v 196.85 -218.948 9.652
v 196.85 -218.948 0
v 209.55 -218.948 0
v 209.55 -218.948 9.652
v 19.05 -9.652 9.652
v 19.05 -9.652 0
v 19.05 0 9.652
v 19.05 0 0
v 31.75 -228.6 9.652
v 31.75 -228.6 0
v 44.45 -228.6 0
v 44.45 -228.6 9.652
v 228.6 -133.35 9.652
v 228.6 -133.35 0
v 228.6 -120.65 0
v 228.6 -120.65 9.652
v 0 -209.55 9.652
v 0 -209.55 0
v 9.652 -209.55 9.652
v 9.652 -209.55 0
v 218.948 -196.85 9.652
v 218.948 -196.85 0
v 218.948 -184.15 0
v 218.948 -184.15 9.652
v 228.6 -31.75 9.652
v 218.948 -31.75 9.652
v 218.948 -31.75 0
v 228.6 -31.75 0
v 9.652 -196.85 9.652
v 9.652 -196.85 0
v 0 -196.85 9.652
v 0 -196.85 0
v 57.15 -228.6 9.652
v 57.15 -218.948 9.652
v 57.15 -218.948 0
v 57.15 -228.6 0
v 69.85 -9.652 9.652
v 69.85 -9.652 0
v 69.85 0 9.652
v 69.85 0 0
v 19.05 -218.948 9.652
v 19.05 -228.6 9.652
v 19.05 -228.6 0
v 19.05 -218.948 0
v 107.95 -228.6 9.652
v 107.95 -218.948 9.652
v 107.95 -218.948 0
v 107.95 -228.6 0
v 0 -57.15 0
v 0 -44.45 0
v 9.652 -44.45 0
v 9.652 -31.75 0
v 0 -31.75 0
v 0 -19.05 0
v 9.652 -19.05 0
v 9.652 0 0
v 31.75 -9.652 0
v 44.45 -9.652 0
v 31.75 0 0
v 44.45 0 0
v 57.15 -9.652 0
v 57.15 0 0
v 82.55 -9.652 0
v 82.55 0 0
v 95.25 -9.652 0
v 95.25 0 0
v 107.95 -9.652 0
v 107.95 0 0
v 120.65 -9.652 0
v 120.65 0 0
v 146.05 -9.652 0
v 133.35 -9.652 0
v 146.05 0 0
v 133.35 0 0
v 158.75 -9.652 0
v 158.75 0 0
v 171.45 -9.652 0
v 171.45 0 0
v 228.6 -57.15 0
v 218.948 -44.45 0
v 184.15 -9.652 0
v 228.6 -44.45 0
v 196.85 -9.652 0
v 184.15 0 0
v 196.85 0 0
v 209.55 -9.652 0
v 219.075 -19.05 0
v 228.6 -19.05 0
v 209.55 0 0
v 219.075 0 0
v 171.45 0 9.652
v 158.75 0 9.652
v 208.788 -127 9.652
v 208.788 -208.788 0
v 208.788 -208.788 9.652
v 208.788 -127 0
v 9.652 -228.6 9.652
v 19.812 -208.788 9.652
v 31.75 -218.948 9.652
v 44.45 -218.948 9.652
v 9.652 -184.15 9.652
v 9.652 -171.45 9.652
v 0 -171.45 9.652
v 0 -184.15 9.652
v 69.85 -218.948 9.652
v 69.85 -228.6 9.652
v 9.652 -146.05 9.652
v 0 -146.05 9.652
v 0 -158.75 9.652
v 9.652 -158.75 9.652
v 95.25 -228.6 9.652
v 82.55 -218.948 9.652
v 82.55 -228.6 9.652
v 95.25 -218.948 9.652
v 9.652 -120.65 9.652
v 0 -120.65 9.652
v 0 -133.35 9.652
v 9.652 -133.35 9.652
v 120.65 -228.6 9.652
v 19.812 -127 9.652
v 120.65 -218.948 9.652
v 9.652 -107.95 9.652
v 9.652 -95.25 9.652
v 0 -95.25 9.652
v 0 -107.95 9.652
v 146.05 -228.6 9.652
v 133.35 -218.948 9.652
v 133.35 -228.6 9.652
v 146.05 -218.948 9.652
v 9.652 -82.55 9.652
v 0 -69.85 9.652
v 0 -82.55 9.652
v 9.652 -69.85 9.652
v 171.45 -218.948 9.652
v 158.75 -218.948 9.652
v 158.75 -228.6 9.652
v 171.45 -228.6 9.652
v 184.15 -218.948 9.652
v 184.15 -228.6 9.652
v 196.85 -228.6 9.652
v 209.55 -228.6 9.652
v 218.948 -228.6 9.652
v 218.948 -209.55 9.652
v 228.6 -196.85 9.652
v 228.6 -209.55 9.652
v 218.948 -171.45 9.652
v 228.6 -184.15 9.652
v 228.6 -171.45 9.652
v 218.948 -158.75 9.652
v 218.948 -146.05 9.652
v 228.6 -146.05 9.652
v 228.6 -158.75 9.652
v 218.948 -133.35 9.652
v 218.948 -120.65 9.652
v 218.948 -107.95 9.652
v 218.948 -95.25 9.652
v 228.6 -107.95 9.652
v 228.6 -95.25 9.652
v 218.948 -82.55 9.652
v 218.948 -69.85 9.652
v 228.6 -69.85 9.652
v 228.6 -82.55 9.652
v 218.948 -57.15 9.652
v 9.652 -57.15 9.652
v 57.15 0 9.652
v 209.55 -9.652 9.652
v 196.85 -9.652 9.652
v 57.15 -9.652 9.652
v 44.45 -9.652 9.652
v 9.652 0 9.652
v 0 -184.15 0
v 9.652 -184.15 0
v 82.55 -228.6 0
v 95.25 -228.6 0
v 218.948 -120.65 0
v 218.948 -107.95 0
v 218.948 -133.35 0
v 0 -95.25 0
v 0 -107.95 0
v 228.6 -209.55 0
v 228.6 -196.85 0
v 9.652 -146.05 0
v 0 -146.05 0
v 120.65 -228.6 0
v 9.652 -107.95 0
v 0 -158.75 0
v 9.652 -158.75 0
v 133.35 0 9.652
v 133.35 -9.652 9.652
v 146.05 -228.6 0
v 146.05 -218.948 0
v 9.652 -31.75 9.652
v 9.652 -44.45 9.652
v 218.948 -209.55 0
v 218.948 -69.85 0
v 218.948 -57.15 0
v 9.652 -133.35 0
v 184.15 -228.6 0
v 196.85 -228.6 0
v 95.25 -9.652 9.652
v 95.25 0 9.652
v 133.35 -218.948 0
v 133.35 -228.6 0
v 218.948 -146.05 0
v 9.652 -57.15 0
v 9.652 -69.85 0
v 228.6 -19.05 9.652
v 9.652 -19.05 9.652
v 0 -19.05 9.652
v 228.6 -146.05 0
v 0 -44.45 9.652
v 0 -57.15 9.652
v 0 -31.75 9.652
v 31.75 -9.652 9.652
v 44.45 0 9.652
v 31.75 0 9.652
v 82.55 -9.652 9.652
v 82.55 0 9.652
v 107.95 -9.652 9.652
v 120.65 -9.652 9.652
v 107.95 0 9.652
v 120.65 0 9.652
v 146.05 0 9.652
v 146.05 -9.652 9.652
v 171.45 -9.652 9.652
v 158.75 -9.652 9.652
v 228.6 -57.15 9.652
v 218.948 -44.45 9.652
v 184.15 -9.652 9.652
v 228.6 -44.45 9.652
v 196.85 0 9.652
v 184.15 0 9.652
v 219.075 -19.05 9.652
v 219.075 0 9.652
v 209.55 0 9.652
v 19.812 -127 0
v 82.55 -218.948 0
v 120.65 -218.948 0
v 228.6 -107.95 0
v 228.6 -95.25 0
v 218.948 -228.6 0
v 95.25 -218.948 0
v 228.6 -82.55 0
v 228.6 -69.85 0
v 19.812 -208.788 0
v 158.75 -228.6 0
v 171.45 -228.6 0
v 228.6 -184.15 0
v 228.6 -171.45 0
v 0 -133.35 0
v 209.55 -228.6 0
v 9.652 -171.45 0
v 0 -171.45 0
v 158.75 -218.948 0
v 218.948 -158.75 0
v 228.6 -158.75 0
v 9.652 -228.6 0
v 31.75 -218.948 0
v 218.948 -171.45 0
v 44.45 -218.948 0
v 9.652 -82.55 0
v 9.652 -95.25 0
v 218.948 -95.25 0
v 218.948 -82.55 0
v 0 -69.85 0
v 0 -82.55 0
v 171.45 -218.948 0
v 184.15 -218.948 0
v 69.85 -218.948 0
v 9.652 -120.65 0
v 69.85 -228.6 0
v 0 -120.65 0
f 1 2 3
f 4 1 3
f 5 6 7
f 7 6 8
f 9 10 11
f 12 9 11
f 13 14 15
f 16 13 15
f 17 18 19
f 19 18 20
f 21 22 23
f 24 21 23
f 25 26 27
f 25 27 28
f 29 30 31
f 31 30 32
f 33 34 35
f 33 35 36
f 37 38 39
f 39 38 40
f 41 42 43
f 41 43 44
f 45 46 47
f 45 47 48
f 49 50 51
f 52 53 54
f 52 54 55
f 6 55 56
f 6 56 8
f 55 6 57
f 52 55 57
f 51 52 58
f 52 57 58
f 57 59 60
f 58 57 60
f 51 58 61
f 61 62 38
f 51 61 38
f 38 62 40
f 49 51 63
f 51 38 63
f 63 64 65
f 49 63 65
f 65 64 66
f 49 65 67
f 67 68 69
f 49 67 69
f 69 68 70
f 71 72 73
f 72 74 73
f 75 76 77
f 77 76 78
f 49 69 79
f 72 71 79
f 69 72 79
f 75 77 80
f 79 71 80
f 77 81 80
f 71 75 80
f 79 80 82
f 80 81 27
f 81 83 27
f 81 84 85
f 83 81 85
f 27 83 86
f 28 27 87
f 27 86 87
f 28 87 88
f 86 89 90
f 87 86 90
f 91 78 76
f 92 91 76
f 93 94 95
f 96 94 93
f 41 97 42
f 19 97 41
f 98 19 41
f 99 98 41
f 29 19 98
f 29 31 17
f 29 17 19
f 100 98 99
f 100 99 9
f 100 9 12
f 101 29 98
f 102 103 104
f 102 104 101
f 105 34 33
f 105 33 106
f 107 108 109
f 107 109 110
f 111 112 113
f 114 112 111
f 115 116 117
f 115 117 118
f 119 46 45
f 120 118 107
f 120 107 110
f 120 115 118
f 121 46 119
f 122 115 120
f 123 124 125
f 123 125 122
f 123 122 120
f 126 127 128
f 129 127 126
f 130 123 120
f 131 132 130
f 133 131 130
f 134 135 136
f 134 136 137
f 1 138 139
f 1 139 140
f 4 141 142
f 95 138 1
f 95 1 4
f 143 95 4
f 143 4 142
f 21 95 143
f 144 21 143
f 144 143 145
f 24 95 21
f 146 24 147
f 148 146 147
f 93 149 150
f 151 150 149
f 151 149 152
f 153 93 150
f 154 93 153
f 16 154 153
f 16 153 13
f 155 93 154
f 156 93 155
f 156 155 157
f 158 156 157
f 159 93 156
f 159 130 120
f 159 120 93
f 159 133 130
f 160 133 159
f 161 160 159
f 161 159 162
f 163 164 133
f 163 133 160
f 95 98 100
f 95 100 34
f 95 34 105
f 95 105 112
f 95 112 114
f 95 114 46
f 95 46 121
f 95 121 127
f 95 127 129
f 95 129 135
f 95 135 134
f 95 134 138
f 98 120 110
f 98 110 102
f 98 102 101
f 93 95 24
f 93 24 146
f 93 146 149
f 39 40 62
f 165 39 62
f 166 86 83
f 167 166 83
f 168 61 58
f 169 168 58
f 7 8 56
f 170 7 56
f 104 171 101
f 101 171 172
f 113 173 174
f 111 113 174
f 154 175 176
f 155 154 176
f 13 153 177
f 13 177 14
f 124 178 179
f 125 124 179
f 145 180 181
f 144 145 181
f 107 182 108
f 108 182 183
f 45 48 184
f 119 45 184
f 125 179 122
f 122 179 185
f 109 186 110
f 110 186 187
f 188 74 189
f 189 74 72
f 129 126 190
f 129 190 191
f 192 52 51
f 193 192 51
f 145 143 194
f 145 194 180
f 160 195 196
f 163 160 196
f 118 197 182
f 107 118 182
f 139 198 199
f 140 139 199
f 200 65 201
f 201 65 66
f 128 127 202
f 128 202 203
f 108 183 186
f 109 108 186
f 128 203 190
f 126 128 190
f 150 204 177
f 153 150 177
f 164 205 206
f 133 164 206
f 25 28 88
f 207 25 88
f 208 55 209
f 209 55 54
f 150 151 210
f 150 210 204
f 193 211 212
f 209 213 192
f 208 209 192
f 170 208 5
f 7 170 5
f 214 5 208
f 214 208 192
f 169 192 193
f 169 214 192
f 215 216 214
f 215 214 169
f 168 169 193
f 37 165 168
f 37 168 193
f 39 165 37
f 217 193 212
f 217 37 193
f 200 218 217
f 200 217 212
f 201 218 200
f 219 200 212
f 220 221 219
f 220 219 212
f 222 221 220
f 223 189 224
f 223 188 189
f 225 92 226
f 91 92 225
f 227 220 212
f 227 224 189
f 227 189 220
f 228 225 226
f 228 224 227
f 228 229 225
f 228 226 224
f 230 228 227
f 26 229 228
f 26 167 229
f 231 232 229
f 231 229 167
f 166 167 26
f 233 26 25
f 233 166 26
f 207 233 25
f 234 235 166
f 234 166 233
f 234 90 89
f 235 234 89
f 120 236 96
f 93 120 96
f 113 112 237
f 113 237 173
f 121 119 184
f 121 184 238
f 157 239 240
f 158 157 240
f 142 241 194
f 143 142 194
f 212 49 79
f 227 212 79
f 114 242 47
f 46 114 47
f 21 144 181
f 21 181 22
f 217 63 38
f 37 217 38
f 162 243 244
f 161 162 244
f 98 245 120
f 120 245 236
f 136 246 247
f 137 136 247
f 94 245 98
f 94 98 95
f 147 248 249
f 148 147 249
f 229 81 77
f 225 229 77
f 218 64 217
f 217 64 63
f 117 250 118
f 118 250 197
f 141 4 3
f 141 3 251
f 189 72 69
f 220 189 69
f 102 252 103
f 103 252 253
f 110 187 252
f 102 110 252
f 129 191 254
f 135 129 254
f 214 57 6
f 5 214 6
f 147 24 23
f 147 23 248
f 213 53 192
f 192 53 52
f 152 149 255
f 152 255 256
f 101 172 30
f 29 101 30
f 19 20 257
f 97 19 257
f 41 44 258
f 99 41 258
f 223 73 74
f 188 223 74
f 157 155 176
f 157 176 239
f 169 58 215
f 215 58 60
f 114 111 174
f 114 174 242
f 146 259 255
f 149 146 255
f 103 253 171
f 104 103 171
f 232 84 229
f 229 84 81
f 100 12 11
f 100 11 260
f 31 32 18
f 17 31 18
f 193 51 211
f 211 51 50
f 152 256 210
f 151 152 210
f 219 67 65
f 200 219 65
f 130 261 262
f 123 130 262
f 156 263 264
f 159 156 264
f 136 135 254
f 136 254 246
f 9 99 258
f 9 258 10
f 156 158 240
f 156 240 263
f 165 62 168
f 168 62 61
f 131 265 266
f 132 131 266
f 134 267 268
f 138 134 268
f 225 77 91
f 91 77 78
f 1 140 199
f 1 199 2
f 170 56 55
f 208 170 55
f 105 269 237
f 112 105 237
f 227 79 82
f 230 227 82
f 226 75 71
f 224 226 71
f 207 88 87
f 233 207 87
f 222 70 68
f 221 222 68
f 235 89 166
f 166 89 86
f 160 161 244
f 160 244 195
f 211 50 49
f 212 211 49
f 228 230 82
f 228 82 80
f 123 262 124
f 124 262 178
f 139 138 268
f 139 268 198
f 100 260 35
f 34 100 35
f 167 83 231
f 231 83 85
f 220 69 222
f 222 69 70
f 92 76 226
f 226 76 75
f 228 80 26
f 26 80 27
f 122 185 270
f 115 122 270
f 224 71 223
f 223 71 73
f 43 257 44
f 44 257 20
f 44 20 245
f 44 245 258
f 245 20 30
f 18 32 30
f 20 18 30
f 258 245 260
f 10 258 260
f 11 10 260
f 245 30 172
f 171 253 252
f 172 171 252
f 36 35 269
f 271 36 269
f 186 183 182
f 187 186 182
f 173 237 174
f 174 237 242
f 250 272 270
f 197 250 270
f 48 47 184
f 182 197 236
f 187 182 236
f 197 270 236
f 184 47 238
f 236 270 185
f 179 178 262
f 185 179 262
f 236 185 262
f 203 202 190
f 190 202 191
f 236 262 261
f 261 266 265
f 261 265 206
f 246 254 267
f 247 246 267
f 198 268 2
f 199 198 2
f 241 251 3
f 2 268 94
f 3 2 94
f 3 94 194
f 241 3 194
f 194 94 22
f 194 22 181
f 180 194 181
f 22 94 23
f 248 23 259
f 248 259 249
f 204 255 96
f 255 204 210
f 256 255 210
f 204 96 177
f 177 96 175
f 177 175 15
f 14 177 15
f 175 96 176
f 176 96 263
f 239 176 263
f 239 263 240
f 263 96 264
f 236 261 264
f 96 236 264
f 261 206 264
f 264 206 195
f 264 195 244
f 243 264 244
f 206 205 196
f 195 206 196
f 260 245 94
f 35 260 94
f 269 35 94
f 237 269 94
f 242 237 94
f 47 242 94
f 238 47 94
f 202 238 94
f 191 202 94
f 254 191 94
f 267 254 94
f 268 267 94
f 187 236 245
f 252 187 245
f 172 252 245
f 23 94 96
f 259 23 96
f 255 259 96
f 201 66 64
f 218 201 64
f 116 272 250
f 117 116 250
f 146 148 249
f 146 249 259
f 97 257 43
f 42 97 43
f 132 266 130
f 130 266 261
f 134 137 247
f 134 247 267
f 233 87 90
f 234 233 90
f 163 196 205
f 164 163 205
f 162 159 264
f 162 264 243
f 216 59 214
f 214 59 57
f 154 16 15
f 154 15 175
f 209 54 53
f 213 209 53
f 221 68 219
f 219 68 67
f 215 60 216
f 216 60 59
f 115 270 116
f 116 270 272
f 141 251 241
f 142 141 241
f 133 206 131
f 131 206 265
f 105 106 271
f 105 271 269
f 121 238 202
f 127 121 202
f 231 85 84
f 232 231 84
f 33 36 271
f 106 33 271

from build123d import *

# Parameters (mm, degrees)
F1_DEPTH = 9.652
F0_W     = 188.976
F0_H     = 81.788
F2_DEPTH = 9.652


with BuildPart() as f1:
    # F0 (on Top) → F1 (new body)
    with BuildSketch(Plane.XY):
        Polygon((19.05, 0), (9.652, 0), (9.652, -19.05), (0, -19.05), (0, -31.75), (9.652, -31.75), (9.652, -44.45), (0, -44.45), (0, -57.15), (9.652, -57.15), (218.948, -57.15), (228.6, -57.15), (228.6, -44.45), (218.948, -44.45), (218.948, -31.75), (228.6, -31.75), (228.6, -19.05), (219.075, -19.05), (219.075, 0), (209.55, 0), (209.55, -9.652), (196.85, -9.652), (196.85, 0), (184.15, 0), (184.15, -9.652), (171.45, -9.652), (171.45, 0), (158.75, 0), (158.75, -9.652), (146.05, -9.652), (146.05, 0), (133.35, 0), (133.35, -9.652), (120.65, -9.652), (120.65, 0), (107.95, 0), (107.95, -9.652), (95.25, -9.652), (95.25, 0), (82.55, 0), (82.55, -9.652), (69.85, -9.652), (69.85, 0), (57.15, 0), (57.15, -9.652), (44.45, -9.652), (44.45, 0), (31.75, 0), (31.75, -9.652), (19.05, -9.652), align=None)
    extrude(amount=F1_DEPTH)


with BuildPart() as f2:
    # F0 (on Top) → F2 (new body)
    with BuildSketch(Plane.XY):
        Polygon((218.948, -57.15), (9.652, -57.15), (9.652, -69.85), (0, -69.85), (0, -82.55), (9.652, -82.55), (9.652, -95.25), (0, -95.25), (0, -107.95), (9.652, -107.95), (9.652, -120.65), (0, -120.65), (0, -133.35), (9.652, -133.35), (9.652, -146.05), (0, -146.05), (0, -158.75), (9.652, -158.75), (9.652, -171.45), (0, -171.45), (0, -184.15), (9.652, -184.15), (9.652, -196.85), (0, -196.85), (0, -209.55), (9.652, -209.55), (9.652, -228.6), (19.05, -228.6), (19.05, -218.948), (31.75, -218.948), (31.75, -228.6), (44.45, -228.6), (44.45, -218.948), (57.15, -218.948), (57.15, -228.6), (69.85, -228.6), (69.85, -218.948), (82.55, -218.948), (82.55, -228.6), (95.25, -228.6), (95.25, -218.948), (107.95, -218.948), (107.95, -228.6), (120.65, -228.6), (120.65, -218.948), (133.35, -218.948), (133.35, -228.6), (146.05, -228.6), (146.05, -218.948), (158.75, -218.948), (158.75, -228.6), (171.45, -228.6), (171.45, -218.948), (184.15, -218.948), (184.15, -228.6), (196.85, -228.6), (196.85, -218.948), (209.55, -218.948), (209.55, -228.6), (218.948, -228.6), (218.948, -209.55), (228.6, -209.55), (228.6, -196.85), (218.948, -196.85), (218.948, -184.15), (228.6, -184.15), (228.6, -171.45), (218.948, -171.45), (218.948, -158.75), (228.6, -158.75), (228.6, -146.05), (218.948, -146.05), (218.948, -133.35), (228.6, -133.35), (228.6, -120.65), (218.948, -120.65), (218.948, -107.95), (228.6, -107.95), (228.6, -95.25), (218.948, -95.25), (218.948, -82.55), (228.6, -82.55), (228.6, -69.85), (218.948, -69.85), align=None)
        with Locations((114.3, -167.894)):
            Rectangle(F0_W, F0_H, mode=Mode.SUBTRACT)
    extrude(amount=F2_DEPTH)


solid = Compound([f1.part, f2.part])
